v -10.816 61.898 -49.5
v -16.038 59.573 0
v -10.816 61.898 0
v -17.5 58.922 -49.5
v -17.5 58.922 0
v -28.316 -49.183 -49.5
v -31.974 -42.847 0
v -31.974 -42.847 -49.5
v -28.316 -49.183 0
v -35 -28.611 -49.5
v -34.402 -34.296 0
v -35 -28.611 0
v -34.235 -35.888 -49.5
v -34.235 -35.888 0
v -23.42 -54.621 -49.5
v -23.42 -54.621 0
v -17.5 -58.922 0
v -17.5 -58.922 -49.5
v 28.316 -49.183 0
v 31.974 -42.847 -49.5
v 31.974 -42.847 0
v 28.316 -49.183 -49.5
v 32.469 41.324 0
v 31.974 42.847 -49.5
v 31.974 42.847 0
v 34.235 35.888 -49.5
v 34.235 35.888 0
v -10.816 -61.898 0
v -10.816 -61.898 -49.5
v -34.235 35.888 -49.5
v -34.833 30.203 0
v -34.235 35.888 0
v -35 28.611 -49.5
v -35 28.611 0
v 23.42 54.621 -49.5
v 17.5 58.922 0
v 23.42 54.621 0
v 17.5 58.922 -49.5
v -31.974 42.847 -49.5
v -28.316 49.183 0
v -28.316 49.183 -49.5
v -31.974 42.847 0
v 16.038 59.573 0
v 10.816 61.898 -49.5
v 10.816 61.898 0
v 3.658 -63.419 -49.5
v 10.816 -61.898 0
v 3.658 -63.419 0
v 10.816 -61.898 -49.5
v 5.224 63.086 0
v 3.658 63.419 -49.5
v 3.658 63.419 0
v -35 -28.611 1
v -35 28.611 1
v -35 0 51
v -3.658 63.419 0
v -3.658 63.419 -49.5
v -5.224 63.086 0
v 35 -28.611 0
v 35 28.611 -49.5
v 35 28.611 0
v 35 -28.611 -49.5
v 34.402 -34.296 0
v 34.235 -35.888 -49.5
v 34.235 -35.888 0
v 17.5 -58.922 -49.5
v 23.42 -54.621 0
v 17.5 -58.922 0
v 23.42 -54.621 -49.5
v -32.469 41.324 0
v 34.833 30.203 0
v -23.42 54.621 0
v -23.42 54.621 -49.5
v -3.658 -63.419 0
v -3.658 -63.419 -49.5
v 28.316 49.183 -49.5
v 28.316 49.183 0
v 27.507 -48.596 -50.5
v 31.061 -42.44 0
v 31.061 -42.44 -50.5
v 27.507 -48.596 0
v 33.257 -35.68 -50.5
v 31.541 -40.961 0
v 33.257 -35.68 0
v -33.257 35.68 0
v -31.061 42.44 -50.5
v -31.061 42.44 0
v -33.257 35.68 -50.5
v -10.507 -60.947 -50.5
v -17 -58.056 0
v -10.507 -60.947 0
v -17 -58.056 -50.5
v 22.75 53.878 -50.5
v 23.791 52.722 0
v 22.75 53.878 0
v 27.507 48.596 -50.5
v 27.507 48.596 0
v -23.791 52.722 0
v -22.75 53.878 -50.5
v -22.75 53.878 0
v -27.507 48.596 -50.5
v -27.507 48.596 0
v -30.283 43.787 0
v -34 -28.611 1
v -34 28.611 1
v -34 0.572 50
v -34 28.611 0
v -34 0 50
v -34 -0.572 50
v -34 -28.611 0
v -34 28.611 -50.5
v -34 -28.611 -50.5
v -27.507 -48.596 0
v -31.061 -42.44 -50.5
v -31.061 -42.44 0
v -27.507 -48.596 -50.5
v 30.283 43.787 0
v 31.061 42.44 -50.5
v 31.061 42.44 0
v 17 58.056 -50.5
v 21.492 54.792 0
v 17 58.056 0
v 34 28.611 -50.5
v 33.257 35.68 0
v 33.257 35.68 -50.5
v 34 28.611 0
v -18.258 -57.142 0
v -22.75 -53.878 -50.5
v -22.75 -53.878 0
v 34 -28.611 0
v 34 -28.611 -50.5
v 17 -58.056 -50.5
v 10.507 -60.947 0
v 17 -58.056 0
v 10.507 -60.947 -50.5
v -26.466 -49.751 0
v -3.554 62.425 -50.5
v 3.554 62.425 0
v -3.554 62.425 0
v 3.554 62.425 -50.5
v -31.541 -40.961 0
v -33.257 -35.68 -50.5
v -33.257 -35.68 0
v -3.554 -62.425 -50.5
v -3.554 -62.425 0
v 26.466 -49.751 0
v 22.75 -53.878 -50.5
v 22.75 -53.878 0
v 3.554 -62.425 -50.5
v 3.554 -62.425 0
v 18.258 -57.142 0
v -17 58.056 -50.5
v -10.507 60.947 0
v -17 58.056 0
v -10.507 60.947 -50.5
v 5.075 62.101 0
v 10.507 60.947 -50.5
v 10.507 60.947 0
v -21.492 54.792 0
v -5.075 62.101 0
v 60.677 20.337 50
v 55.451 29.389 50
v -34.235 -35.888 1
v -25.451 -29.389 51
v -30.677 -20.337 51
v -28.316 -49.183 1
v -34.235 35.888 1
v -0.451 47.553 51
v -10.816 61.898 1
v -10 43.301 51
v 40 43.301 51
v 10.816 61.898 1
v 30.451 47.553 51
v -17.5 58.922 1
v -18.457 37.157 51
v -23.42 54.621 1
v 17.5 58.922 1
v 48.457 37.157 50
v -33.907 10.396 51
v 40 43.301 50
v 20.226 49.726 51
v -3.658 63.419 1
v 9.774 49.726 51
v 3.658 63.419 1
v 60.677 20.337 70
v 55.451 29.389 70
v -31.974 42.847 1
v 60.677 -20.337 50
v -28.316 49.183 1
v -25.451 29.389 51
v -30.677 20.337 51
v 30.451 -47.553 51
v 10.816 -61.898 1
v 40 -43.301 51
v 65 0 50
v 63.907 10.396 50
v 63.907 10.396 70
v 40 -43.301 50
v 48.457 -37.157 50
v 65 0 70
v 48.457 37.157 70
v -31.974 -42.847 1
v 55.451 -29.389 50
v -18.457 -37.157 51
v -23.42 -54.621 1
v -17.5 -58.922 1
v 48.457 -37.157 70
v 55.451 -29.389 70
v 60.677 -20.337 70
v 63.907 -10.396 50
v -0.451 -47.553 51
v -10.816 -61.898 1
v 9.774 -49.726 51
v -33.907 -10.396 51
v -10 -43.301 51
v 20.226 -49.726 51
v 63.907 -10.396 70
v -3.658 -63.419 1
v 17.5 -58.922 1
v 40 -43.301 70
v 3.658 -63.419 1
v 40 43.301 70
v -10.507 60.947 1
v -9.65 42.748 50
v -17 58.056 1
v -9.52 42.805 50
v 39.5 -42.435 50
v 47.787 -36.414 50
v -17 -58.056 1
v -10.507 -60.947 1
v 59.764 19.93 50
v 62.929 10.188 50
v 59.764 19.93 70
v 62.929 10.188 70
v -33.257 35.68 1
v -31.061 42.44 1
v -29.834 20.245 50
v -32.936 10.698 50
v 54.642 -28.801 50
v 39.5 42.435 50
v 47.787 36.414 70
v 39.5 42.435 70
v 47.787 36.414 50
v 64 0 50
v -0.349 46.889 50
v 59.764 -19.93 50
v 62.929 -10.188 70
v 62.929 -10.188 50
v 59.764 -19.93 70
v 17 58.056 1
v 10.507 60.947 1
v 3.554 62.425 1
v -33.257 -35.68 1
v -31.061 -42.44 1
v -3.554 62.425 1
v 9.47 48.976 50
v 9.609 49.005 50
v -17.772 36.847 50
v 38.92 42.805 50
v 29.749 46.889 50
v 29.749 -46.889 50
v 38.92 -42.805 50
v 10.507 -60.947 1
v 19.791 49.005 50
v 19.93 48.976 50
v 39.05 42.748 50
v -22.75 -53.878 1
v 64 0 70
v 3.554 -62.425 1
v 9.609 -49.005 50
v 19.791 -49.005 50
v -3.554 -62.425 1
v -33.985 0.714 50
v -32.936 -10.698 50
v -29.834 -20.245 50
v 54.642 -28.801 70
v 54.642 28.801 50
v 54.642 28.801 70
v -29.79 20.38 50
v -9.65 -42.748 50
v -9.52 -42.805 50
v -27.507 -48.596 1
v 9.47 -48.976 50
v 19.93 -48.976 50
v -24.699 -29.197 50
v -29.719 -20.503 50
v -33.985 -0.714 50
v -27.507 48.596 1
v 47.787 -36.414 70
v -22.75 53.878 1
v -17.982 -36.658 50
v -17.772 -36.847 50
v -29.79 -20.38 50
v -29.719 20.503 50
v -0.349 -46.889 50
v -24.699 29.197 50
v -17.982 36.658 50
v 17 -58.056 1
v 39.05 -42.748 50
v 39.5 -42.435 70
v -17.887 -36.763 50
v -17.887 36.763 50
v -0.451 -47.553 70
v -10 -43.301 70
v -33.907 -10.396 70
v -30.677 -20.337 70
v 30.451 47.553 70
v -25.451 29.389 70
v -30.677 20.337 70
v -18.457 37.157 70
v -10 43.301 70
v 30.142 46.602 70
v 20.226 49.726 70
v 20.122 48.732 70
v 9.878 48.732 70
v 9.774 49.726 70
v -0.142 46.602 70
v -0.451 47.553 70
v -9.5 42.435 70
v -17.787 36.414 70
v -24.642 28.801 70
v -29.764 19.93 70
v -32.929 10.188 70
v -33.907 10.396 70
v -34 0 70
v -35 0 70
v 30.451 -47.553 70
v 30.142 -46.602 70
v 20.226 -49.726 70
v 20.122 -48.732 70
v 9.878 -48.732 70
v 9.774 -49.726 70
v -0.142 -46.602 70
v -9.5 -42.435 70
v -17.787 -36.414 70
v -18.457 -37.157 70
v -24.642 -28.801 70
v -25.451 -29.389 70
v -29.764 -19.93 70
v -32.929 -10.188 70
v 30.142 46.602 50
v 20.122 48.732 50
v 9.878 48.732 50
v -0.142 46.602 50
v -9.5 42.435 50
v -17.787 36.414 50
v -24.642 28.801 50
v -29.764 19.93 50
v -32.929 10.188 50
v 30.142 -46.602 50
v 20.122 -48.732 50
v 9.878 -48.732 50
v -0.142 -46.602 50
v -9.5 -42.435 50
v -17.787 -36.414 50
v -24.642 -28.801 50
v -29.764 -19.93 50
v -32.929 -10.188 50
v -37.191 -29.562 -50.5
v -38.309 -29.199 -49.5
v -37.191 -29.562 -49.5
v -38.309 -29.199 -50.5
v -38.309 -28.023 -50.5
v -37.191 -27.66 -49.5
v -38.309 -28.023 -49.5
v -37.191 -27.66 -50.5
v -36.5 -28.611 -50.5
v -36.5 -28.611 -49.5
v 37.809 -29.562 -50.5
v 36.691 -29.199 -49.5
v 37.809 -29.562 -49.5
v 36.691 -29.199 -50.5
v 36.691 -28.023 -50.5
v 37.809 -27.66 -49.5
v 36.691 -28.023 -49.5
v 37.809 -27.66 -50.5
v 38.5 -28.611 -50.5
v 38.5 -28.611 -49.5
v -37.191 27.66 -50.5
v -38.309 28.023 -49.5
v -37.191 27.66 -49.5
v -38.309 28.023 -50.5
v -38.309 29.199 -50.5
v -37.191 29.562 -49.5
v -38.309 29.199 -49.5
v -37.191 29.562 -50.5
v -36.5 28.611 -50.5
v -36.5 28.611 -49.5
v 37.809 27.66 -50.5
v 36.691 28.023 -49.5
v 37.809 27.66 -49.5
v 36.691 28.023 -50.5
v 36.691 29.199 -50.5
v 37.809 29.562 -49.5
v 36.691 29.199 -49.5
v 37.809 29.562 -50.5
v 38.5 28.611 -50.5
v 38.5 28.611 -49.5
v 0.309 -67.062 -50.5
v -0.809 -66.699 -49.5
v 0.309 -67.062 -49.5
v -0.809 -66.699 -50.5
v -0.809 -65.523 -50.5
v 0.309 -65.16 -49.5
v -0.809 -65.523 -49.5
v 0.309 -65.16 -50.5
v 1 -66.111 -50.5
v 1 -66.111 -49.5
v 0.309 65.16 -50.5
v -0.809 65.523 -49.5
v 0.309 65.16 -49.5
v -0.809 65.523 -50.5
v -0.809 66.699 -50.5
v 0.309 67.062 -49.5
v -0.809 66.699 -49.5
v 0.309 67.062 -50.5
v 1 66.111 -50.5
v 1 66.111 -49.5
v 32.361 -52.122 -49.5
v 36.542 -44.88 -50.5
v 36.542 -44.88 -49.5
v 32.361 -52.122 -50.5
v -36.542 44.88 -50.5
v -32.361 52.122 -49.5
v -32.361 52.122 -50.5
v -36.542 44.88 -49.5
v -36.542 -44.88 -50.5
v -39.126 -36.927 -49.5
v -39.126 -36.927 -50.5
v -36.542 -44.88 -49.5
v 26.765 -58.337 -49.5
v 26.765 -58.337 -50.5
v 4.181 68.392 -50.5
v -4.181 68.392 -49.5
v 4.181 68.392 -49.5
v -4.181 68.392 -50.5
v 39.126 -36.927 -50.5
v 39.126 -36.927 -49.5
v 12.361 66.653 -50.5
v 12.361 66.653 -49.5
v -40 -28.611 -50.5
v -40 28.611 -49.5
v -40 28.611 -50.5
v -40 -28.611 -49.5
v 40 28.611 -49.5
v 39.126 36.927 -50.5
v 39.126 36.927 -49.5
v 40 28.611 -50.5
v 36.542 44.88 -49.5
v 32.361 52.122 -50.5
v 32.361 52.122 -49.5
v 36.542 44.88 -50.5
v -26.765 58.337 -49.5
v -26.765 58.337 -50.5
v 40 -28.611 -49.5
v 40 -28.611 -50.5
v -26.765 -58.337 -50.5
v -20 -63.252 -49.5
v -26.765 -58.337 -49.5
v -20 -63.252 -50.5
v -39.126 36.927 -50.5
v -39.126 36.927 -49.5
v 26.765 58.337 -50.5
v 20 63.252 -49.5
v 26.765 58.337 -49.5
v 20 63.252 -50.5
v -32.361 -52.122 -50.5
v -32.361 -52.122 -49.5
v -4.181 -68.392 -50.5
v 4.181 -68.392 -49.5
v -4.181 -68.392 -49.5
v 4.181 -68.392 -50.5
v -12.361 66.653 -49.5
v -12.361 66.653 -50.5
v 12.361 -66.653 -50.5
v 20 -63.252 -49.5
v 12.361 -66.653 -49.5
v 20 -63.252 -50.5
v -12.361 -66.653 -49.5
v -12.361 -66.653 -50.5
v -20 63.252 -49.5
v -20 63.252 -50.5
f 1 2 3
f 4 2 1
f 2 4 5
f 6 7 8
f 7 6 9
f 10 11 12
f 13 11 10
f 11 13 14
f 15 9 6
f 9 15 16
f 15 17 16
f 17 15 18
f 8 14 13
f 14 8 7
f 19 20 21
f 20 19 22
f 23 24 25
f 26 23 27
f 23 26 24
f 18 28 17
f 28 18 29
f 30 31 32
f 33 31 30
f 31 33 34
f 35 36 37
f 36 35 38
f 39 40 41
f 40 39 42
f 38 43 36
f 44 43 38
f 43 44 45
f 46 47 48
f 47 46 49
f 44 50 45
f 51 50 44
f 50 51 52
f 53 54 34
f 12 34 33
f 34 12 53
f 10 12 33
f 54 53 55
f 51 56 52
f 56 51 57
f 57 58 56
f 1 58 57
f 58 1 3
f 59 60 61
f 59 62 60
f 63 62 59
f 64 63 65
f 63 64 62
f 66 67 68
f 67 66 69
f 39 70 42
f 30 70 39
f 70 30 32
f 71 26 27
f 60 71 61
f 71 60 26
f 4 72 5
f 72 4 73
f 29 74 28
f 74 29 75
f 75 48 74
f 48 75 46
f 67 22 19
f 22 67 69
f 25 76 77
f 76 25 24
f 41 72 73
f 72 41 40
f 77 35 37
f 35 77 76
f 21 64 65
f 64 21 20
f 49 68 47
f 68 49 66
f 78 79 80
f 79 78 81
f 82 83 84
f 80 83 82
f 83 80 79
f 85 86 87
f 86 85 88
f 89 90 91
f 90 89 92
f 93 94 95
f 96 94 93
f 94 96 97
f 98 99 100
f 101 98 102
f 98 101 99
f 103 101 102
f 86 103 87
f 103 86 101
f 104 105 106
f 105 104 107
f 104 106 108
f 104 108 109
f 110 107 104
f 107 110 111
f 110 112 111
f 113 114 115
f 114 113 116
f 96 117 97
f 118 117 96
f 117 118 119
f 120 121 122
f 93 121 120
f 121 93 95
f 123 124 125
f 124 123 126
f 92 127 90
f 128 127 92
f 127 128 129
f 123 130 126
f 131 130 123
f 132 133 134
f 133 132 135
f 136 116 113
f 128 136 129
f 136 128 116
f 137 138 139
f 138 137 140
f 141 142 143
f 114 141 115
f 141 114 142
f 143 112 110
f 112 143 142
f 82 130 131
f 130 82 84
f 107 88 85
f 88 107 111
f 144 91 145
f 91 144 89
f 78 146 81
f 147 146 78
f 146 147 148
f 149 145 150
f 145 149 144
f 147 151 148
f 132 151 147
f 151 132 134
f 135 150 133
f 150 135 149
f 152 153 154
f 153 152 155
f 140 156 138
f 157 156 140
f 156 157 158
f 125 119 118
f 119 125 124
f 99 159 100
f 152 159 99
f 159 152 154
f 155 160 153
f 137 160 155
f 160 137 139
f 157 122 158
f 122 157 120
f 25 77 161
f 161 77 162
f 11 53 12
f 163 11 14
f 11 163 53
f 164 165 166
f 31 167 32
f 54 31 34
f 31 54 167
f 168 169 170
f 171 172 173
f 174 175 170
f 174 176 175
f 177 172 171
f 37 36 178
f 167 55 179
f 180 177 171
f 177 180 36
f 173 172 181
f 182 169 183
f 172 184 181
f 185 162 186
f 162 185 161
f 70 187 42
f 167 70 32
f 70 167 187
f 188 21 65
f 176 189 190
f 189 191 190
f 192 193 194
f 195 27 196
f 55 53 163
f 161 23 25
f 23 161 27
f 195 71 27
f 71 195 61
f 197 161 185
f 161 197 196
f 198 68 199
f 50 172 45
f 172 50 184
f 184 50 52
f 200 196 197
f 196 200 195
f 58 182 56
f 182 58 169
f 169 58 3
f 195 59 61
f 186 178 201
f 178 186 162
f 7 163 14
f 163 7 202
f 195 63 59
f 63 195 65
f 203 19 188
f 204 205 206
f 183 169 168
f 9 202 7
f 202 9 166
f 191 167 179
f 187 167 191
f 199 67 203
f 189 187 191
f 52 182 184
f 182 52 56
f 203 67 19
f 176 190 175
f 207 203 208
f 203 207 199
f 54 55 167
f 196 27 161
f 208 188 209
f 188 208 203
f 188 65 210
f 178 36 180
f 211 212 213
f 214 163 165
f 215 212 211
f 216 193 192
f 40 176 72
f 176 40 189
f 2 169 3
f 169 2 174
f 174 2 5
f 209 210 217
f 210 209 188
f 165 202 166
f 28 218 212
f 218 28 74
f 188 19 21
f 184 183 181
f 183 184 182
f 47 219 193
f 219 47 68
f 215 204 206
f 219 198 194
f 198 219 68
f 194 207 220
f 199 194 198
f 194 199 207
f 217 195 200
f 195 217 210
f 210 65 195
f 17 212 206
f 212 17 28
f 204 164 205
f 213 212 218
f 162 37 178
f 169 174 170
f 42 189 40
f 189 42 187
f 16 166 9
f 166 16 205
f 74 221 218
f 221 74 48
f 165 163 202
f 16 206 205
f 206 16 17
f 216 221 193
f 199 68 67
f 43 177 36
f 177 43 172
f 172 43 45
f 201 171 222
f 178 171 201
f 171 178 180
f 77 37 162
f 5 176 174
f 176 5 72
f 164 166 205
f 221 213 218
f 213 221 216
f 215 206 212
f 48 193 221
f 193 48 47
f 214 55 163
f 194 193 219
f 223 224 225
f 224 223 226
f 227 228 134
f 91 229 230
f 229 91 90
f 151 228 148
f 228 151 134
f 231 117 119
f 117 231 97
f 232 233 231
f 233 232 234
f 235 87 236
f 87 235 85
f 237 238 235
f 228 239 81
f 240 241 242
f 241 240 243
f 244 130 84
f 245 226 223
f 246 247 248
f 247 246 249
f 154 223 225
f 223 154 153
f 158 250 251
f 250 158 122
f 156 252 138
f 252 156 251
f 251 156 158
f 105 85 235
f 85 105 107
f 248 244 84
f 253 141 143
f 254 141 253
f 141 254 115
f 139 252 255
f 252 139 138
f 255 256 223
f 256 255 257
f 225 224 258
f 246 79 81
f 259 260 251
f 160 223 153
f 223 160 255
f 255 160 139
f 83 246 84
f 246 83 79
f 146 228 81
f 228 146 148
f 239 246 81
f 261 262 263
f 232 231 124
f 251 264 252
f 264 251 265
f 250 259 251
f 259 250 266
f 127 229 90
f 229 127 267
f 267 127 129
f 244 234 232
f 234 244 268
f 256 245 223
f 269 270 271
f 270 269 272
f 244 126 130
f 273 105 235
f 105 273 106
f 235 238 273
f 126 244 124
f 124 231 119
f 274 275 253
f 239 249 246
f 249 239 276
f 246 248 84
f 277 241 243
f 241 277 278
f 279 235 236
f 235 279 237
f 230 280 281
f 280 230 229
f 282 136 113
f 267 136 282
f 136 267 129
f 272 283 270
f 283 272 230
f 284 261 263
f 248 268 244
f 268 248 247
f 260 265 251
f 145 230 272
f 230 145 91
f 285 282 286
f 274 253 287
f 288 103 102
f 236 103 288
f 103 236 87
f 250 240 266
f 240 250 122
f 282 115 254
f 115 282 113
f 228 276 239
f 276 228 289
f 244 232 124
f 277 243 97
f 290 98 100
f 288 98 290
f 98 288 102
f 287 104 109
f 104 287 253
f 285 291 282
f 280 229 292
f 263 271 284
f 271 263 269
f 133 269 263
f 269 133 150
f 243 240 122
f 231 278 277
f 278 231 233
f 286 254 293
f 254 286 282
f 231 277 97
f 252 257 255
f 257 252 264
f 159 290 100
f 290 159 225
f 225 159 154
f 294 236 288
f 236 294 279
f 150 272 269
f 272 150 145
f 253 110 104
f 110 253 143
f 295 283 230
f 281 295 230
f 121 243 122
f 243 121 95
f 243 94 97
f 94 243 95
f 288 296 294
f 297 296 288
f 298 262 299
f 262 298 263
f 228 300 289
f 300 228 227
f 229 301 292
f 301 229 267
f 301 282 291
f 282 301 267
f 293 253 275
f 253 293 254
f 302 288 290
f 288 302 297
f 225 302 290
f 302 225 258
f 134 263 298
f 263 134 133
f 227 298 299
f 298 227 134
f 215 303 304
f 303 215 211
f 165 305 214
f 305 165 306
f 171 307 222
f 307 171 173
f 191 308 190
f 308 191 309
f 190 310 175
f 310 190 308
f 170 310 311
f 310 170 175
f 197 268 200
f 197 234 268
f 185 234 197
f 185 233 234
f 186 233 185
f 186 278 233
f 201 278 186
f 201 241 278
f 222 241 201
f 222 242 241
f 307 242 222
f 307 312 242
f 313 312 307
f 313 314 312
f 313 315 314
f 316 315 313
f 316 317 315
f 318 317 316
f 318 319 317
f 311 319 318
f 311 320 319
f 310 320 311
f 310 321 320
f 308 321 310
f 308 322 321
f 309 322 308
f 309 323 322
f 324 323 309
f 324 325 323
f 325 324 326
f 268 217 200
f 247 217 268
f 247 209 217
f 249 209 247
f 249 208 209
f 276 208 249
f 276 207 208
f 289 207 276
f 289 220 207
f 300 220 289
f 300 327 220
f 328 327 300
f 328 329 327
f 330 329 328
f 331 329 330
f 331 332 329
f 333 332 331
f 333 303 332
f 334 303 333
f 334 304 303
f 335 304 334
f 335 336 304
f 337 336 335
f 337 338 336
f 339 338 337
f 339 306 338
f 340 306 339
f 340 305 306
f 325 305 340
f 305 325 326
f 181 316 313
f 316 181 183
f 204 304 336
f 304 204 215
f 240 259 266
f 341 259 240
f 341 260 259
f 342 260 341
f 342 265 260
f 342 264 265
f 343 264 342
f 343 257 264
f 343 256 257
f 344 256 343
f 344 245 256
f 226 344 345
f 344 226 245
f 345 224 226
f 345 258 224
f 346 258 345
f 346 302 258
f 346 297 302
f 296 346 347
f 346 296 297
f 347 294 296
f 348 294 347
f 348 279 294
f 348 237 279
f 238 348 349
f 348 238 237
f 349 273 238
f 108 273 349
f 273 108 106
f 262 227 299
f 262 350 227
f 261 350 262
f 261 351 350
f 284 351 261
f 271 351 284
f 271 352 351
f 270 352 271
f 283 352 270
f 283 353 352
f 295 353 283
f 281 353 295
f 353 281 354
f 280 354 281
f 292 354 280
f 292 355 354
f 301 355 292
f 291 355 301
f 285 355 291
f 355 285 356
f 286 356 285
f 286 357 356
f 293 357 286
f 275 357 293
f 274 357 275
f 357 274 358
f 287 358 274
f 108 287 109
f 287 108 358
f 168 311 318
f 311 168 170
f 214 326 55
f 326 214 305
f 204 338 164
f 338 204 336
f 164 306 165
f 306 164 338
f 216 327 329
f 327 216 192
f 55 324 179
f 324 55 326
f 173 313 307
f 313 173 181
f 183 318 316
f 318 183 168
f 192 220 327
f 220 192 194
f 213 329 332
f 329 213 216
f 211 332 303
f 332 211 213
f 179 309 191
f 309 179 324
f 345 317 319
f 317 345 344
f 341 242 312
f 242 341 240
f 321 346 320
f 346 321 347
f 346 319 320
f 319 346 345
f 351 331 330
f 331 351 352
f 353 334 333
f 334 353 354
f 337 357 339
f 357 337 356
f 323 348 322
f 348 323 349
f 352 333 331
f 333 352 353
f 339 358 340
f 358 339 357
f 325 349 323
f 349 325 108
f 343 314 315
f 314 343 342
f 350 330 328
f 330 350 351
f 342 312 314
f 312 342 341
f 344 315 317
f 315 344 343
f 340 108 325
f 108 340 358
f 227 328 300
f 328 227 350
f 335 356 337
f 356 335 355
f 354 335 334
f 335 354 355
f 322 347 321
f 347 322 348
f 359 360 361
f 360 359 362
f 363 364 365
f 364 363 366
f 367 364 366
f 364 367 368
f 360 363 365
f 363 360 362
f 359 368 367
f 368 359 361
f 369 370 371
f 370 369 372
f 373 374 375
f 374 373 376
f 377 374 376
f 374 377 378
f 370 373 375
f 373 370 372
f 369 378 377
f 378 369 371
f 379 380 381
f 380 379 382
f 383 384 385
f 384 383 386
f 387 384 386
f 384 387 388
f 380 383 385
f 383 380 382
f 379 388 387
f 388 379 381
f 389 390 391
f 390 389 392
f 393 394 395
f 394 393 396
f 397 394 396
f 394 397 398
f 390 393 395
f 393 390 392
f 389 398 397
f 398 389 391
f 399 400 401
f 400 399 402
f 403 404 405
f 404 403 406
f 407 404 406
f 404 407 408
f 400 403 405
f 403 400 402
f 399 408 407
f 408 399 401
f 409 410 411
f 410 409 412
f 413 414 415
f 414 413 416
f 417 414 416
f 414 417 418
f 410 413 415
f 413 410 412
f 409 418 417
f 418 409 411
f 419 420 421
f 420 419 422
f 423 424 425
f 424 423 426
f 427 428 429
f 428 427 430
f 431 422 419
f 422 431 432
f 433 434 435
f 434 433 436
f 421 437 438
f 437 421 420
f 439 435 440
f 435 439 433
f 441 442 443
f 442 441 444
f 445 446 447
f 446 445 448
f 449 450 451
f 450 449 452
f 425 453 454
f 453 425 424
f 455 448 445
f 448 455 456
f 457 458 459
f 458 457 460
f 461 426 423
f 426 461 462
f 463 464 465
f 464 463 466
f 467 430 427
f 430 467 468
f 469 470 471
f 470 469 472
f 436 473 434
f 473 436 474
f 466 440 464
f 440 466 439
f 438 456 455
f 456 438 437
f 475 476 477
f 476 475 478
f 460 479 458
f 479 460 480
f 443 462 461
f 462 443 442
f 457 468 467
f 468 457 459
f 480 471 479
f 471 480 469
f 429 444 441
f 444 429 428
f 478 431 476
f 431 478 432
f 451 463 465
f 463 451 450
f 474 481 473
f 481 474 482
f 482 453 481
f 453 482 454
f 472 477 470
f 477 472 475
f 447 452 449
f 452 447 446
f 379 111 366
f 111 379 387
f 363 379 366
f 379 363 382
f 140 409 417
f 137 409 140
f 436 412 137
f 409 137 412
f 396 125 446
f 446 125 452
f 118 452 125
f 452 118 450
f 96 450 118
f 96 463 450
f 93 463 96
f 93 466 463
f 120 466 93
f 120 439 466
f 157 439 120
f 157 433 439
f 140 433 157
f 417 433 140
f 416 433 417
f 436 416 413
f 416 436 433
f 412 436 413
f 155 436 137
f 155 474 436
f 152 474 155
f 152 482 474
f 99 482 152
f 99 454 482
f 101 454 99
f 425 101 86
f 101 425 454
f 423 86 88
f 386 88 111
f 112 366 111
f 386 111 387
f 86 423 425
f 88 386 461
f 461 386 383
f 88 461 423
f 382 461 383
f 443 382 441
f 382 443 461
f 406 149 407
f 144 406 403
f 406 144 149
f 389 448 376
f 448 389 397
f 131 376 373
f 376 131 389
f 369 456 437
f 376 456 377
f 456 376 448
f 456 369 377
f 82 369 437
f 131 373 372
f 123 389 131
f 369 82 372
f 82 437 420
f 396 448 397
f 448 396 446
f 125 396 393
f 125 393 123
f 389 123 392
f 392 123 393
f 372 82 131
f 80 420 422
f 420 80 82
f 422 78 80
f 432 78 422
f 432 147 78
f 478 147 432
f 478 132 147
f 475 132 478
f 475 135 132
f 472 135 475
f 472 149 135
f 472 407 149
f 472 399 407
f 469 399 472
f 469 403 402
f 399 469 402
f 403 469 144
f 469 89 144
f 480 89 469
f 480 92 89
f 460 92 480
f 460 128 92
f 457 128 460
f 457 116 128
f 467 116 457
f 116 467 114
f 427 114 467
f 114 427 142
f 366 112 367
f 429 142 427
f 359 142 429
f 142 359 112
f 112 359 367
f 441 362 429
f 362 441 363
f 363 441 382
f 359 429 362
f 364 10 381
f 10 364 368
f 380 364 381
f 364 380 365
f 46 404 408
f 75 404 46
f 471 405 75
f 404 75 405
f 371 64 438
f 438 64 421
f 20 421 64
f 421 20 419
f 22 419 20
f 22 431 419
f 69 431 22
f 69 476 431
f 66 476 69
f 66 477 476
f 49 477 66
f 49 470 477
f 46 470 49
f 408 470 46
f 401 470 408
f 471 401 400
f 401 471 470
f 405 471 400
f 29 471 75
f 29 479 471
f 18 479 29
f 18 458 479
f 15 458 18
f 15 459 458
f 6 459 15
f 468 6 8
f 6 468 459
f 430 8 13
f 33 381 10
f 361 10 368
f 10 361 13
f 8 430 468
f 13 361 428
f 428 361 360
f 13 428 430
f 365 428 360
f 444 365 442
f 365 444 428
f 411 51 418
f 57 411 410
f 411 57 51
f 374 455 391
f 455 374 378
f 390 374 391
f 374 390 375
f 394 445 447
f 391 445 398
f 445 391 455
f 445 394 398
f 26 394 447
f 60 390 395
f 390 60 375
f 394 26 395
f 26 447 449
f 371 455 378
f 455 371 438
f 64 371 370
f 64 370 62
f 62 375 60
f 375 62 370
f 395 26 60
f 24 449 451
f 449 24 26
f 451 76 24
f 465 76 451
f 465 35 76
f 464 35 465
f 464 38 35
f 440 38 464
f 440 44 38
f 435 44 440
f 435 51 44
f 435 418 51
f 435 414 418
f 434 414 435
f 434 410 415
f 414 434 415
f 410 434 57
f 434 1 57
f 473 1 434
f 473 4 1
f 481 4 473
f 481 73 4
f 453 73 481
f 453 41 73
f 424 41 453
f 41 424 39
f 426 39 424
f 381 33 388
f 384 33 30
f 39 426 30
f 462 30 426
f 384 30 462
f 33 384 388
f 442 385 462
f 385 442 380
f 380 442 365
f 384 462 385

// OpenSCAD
//how wide you want window to be open i.e the width of your bit of wood
windowOpeningDistance=80; 
//at what depth can we start transitioning into pipe connection
openingDepth=50; //min/max: [10:100]
//thickness of walls
t=1;	
//umm the diameter of your pipe...
pipeDiameter=100;
//offest of pipe opening based on window opening
pipeOffset=15;	//min/max: [0:100]
//how long to take to change from pipe to window slot shape
taperLength=50;	//min/max: [10:100]	
//length that pipe attches to
pipeConnectLength=20;	
//set this to be a bit bigger than the diameter of the head of your screws
lip=5;
//diameter of holes for screws
screwHoleDia=2;

z=openingDepth; 
x=windowOpeningDistance-(2*lip);
y=(PI/4)*((pow(pipeDiameter,2)/x)-x); //height it must be based on x to = surface area of pipe opening i.e no air flow restriction

union(){
translate([0,-y/2,-z/2])
difference(){
	hull(){
		cylinder(r=x/2, h=z, center=true);
		translate([0,y,0]) cylinder(r=x/2, h=z, center=true);
	}
	
	hull(){
		cylinder(r=x/2-t, h=z+t, center=true);
		translate([0,y,0]) cylinder(r=x/2-t, h=z, center=true);
	}
}

translate([0,0,t/2])
difference(){
	hull(){
		translate([0,-y/2,0])
		hull(){
			cylinder(r=x/2, h=t, center=true);
			translate([0,y,0]) cylinder(r=x/2, h=t, center=true);
		}
		translate([pipeOffset,0,taperLength])
		cylinder(r=pipeDiameter/2,h=t,center=true);
	}
	hull(){
		translate([0,-y/2,])
		hull(){
			cylinder(r=x/2-t, h=t, center=true);
			translate([0,y,0]) cylinder(r=x/2-t, h=t, center=true);
		}
		translate([pipeOffset,0,taperLength])
		cylinder(r=pipeDiameter/2-t,h=t,center=true);
	}
}

translate([pipeOffset,0,taperLength])
difference(){
cylinder(r=pipeDiameter/2,h=pipeConnectLength);
cylinder(r=pipeDiameter/2-t,h=pipeConnectLength);
}

translate([0,-y/2,-z])
difference(){
	hull(){
		cylinder(r=x/2+lip, h=t, center=true);
		translate([0,y,0]) cylinder(r=x/2+lip, h=t, center=true);
	}
	
	hull(){
		cylinder(r=x/2-t, h=t, center=true);
		translate([0,y,0]) cylinder(r=x/2-t, h=t, center=true);
	}

    for(j=[0:1]){
        for(i=[-1,1]){
            translate([x*i/2+lip*i/2,y*j,0])
            cylinder(d=screwHoleDia,h=2*t,center=true);
            

        }
        translate([0,y*j+x*(2*j-1)/2+lip*(2*j-1)/2,0])
        cylinder(d=screwHoleDia,h=2*t,center=true);
    }

}

}
